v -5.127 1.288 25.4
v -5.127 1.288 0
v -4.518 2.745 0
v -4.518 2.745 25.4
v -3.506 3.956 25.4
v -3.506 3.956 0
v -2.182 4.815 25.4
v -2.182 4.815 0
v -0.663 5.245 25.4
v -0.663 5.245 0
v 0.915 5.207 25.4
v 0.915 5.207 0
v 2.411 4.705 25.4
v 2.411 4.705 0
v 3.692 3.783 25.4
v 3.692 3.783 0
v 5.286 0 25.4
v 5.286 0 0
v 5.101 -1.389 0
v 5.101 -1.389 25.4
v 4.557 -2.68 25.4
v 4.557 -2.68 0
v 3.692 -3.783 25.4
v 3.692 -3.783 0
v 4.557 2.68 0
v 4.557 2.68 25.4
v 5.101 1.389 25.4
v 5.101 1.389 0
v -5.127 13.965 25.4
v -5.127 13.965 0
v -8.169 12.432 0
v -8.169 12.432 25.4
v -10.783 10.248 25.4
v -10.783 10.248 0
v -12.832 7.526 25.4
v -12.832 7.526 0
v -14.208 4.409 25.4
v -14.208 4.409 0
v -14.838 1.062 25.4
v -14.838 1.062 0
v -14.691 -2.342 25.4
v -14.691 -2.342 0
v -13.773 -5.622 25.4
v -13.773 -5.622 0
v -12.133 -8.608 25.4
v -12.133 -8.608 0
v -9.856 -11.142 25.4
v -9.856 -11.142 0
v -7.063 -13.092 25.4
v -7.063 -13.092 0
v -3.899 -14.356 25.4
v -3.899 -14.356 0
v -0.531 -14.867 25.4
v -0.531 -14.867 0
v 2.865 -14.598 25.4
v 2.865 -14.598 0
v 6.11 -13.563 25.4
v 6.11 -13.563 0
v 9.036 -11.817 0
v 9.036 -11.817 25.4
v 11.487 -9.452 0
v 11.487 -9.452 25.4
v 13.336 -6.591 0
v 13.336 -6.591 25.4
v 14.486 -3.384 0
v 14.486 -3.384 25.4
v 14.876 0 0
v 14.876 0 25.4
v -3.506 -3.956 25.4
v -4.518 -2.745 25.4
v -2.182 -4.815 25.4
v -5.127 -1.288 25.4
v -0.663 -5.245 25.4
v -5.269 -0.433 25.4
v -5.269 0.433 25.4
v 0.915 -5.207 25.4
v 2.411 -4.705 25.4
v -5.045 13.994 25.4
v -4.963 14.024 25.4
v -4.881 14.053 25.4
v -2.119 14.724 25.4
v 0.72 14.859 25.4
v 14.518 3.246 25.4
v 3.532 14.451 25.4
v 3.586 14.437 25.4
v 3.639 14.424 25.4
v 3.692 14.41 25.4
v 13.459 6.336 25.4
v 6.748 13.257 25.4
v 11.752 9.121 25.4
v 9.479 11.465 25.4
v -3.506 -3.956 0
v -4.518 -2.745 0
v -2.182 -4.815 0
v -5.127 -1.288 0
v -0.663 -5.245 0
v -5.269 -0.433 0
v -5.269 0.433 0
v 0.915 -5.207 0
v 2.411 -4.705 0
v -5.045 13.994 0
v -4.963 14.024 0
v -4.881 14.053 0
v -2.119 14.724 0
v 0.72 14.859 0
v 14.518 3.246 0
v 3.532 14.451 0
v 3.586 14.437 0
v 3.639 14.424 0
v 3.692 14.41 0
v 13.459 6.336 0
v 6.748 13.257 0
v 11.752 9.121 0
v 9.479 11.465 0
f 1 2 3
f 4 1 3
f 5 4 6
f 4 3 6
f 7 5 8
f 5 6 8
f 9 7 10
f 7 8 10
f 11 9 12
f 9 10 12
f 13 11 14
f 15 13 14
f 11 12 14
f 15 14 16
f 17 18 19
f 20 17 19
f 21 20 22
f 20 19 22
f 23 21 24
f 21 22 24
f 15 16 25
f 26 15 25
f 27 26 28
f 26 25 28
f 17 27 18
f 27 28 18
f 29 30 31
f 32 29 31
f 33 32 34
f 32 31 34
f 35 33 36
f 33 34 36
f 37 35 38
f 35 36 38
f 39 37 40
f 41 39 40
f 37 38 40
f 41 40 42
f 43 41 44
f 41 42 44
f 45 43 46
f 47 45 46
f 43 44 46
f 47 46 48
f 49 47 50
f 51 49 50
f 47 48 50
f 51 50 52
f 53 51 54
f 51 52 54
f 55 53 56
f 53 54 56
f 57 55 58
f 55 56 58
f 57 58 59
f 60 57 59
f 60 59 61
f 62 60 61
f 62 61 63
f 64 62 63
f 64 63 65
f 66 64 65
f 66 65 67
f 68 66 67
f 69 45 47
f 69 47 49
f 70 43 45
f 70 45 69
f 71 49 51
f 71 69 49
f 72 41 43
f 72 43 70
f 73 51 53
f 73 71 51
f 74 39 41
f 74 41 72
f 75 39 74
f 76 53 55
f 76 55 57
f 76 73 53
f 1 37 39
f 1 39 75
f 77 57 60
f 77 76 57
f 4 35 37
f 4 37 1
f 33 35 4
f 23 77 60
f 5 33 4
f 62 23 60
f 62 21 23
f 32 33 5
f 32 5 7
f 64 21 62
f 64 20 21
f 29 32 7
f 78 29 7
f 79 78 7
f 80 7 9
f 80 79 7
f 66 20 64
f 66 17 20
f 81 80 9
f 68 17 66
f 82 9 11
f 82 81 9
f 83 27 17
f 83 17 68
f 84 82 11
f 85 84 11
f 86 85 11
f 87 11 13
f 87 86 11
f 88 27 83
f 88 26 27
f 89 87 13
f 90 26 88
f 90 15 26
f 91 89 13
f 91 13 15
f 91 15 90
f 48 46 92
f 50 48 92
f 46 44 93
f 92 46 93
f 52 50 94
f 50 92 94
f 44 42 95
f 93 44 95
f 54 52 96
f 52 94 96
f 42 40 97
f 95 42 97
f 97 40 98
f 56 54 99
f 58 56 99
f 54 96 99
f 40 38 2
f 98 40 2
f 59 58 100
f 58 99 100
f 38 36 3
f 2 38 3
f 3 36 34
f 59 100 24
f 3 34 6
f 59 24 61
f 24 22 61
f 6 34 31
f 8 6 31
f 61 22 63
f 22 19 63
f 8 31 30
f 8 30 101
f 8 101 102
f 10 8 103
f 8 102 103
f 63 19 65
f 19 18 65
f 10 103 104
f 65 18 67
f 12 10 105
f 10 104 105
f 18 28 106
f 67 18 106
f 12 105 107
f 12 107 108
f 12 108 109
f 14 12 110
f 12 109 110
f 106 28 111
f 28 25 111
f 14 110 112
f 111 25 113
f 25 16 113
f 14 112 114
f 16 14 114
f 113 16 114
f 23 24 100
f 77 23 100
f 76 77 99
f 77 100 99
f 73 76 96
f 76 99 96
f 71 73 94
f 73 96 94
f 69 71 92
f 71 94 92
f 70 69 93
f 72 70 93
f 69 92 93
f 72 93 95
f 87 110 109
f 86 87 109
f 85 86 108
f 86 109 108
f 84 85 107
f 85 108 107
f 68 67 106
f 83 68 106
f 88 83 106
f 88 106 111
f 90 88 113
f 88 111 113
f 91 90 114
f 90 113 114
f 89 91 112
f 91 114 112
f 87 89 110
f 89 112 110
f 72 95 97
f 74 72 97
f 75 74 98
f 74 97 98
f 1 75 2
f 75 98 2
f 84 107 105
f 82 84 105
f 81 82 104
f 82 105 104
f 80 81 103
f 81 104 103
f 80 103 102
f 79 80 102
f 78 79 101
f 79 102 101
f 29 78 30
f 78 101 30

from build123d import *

# Parameters (mm, degrees)
F2_DEPTH = 25.4


with BuildPart() as f2:
    # F1 (on face) → F2 (new body)
    with BuildSketch(Plane.XY):
        with BuildLine():
            ThreePointArc((-4.8808341445, 14.0525419265), (-5.004069886, 14.0091313477), (-5.1269195974, 13.9646400592))
            Line((-5.1269195974, 13.9646400592), (-5.1269195974, 1.288408295))
            ThreePointArc((-5.1269195974, 1.288408295), (-1.4388144753, 5.0867586338), (3.6924446467, 3.783008462))
            Line((3.6924446467, 3.783008462), (3.6924446467, 14.4104937137))
            ThreePointArc((3.6924446467, 14.4104937137), (3.6125240495, 14.4307361744), (3.5324924947, 14.450535399))
            Line((3.5324924947, 14.450535399), (3.0549003277, 14.0525419265))
            Line((3.0549003277, 14.0525419265), (-4.8808341445, 14.0525419265))
        make_face()
        with BuildLine():
            Line((-5.1269195974, 1.288408295), (-5.1269195974, 13.9646400592))
            ThreePointArc((-5.1269195974, 13.9646400592), (-8.5155220323, -12.1976375196), (14.8760369905, 0))
            ThreePointArc((14.8760369905, 0), (11.752136395, 9.1205135105), (3.6924446467, 14.4104937137))
            Line((3.6924446467, 14.4104937137), (3.6924446467, 3.783008462))
            ThreePointArc((3.6924446467, 3.783008462), (4.8715904415, 2.0525367386), (5.2863314778, 0))
            ThreePointArc((5.2863314778, 0), (4.8715904415, -2.0525367386), (3.6924446467, -3.783008462))
            Line((3.6924446467, -3.783008462), (3.6924446467, -11.555492878))
            Line((3.6924446467, -11.555492878), (-4.7550187446, -10.9179485589))
            Line((-4.7550187446, -10.9179485589), (-5.1269195974, -10.9179485589))
            Line((-5.1269195974, -10.9179485589), (-5.1269195974, -1.288408295))
            ThreePointArc((-5.1269195974, -1.288408295), (-5.2863314778, 0), (-5.1269195974, 1.288408295))
        make_face()
        with BuildLine():
            ThreePointArc((3.5324924947, 14.450535399), (-0.7029267403, 14.8594202626), (-4.8808341445, 14.0525419265))
            Line((-4.8808341445, 14.0525419265), (3.0549003277, 14.0525419265))
            Line((3.0549003277, 14.0525419265), (3.5324924947, 14.450535399))
        make_face()
        with BuildLine():
            ThreePointArc((3.6924446467, -3.783008462), (-1.4388144753, -5.0867586338), (-5.1269195974, -1.288408295))
            Line((-5.1269195974, -1.288408295), (-5.1269195974, -10.9179485589))
            Line((-5.1269195974, -10.9179485589), (-4.7550187446, -10.9179485589))
            Line((-4.7550187446, -10.9179485589), (3.6924446467, -11.555492878))
            Line((3.6924446467, -11.555492878), (3.6924446467, -3.783008462))
        make_face()
    extrude(amount=F2_DEPTH)


solid = f2.part
